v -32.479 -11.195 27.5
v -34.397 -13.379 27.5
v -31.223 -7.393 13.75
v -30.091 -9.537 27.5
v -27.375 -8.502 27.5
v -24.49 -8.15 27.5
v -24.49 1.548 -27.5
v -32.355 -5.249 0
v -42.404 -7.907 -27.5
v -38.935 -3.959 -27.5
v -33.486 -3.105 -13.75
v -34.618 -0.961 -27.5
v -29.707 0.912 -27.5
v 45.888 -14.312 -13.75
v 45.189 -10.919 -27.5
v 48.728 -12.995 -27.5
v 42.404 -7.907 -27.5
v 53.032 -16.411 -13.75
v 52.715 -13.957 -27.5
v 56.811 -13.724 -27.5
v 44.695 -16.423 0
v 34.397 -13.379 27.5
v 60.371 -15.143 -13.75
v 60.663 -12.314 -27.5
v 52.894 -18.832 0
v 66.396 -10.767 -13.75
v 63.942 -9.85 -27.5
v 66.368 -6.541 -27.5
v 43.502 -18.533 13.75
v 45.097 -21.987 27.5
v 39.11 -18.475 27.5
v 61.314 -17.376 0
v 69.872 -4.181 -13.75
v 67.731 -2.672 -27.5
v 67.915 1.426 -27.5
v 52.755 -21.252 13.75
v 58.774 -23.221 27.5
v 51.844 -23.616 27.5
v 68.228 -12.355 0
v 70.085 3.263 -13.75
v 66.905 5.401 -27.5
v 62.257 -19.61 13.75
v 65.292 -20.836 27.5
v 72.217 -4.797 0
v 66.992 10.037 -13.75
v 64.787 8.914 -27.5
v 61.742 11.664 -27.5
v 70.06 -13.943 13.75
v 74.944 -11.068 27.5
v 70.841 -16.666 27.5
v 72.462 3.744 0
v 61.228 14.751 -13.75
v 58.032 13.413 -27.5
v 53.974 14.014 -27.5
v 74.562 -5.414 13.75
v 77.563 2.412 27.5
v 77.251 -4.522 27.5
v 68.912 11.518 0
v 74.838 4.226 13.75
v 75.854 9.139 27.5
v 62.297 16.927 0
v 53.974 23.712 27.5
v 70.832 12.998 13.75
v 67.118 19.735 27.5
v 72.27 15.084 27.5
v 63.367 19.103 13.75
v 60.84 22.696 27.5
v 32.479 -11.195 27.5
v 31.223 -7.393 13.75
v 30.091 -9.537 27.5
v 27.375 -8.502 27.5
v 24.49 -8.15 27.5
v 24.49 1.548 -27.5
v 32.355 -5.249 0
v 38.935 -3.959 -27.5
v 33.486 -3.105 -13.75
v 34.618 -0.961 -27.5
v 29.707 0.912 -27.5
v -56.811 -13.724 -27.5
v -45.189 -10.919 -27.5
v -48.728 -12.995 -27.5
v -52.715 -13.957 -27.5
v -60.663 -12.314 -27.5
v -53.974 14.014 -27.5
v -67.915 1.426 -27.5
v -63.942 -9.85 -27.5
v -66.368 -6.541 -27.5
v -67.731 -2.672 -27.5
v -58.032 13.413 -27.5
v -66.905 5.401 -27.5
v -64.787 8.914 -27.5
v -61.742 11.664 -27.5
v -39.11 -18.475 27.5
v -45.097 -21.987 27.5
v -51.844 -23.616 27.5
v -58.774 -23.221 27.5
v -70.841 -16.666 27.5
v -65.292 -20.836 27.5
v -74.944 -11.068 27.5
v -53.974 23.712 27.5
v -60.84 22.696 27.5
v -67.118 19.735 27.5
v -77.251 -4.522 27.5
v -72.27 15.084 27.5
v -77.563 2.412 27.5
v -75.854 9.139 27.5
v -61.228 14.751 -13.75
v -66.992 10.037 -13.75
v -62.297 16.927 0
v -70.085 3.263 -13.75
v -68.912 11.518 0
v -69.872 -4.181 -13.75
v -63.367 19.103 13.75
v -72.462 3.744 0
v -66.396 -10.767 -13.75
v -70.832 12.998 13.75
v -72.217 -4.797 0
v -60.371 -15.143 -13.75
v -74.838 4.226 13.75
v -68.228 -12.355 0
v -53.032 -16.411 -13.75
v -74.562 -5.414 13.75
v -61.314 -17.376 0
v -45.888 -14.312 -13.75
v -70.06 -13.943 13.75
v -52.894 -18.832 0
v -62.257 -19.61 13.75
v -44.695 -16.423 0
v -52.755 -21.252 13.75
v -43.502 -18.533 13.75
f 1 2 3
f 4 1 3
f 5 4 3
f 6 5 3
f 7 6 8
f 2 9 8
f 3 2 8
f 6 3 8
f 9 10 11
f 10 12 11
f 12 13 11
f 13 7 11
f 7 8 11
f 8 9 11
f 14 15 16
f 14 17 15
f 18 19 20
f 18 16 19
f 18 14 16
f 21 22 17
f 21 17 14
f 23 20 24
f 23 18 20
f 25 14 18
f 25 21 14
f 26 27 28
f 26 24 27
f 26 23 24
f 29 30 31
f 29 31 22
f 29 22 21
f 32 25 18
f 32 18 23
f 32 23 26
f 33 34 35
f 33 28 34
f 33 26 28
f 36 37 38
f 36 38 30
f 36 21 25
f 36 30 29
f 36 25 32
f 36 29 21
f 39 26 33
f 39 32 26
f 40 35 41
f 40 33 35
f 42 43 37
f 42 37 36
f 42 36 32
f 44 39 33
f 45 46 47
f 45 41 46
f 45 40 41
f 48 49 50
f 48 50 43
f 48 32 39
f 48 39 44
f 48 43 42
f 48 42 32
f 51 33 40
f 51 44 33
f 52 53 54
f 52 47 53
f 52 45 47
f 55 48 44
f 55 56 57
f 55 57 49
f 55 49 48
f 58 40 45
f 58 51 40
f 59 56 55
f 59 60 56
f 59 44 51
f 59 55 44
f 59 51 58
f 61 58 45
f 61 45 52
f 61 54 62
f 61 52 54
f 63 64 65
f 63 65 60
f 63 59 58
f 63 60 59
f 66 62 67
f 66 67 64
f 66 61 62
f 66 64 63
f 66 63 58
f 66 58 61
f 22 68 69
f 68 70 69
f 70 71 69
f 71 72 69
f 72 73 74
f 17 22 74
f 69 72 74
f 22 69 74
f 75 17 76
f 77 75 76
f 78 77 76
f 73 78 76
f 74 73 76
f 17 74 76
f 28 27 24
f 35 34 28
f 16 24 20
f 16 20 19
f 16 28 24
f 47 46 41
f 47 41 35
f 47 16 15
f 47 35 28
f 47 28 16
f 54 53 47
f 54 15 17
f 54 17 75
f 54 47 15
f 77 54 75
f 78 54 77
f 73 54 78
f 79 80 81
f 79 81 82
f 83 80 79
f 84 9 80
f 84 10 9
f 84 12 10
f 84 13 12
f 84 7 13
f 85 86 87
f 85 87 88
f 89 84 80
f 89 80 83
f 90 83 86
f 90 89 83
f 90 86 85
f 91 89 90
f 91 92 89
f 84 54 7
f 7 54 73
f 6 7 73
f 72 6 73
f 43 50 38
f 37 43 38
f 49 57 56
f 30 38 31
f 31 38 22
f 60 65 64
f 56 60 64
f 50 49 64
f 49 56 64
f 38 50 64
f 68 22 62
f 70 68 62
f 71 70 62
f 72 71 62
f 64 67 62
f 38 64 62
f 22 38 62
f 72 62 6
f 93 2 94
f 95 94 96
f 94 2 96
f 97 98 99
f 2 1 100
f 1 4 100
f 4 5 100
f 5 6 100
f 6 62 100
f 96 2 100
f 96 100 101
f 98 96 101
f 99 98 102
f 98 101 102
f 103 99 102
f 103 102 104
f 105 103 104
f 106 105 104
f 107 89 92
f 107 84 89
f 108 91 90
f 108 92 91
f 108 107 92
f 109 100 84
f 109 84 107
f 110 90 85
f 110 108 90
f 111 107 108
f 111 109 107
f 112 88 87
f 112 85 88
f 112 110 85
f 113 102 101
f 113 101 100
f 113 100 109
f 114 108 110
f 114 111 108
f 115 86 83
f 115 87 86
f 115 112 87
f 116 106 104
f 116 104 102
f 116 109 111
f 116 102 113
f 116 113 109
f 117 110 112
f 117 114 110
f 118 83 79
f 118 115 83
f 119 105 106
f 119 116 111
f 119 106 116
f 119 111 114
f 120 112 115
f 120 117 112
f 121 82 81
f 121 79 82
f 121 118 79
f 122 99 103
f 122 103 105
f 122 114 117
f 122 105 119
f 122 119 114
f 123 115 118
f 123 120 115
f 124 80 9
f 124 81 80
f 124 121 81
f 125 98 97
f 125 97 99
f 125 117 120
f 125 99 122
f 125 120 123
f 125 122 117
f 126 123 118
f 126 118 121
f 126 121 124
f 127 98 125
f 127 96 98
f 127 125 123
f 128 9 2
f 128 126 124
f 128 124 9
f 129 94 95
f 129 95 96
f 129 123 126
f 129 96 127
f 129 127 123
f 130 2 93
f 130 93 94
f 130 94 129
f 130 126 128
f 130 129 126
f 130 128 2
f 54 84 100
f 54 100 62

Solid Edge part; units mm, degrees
sketch "Sketch1" plane through (0, 0, 0) normal (0, 0, 1) x (1, 0, 0)
  line L0 (-53.9742, 23.7118) -> (53.9742, 23.7118)
  line L1 (-31.7069, -8.1496) -> (31.7069, -8.1496)
  arc A0 (-31.7069, -8.1496) -> (-53.9742, 23.7118) centre (-53.9742, 0) cw
  arc A1 (53.9742, 23.7118) -> (31.7069, -8.1496) centre (53.9742, 0) cw
extrude "Protrusion1" add sketch "Sketch1" along normal mid plane 55
fillet "Round_1" radius 12 2 edges at (-31.7069, -8.1496, 0) (31.7069, -8.1496, 0)
draft "Draft1" angle 10 neutral plane through (0, 0, 27.5) normal (0, 0, 1) pull direction (0, 0, -1) face at (-37.0623, 23.7118, 17.7833) face at (-16.8164, -8.1496, 17.7833) face at (-46.3591, -22.4557, 17.7833) face at (-33.2565, -11.9553, -17.7833) face at (68.2174, 18.9573, 17.7833) face at (33.2565, -11.9553, 17.7833)
